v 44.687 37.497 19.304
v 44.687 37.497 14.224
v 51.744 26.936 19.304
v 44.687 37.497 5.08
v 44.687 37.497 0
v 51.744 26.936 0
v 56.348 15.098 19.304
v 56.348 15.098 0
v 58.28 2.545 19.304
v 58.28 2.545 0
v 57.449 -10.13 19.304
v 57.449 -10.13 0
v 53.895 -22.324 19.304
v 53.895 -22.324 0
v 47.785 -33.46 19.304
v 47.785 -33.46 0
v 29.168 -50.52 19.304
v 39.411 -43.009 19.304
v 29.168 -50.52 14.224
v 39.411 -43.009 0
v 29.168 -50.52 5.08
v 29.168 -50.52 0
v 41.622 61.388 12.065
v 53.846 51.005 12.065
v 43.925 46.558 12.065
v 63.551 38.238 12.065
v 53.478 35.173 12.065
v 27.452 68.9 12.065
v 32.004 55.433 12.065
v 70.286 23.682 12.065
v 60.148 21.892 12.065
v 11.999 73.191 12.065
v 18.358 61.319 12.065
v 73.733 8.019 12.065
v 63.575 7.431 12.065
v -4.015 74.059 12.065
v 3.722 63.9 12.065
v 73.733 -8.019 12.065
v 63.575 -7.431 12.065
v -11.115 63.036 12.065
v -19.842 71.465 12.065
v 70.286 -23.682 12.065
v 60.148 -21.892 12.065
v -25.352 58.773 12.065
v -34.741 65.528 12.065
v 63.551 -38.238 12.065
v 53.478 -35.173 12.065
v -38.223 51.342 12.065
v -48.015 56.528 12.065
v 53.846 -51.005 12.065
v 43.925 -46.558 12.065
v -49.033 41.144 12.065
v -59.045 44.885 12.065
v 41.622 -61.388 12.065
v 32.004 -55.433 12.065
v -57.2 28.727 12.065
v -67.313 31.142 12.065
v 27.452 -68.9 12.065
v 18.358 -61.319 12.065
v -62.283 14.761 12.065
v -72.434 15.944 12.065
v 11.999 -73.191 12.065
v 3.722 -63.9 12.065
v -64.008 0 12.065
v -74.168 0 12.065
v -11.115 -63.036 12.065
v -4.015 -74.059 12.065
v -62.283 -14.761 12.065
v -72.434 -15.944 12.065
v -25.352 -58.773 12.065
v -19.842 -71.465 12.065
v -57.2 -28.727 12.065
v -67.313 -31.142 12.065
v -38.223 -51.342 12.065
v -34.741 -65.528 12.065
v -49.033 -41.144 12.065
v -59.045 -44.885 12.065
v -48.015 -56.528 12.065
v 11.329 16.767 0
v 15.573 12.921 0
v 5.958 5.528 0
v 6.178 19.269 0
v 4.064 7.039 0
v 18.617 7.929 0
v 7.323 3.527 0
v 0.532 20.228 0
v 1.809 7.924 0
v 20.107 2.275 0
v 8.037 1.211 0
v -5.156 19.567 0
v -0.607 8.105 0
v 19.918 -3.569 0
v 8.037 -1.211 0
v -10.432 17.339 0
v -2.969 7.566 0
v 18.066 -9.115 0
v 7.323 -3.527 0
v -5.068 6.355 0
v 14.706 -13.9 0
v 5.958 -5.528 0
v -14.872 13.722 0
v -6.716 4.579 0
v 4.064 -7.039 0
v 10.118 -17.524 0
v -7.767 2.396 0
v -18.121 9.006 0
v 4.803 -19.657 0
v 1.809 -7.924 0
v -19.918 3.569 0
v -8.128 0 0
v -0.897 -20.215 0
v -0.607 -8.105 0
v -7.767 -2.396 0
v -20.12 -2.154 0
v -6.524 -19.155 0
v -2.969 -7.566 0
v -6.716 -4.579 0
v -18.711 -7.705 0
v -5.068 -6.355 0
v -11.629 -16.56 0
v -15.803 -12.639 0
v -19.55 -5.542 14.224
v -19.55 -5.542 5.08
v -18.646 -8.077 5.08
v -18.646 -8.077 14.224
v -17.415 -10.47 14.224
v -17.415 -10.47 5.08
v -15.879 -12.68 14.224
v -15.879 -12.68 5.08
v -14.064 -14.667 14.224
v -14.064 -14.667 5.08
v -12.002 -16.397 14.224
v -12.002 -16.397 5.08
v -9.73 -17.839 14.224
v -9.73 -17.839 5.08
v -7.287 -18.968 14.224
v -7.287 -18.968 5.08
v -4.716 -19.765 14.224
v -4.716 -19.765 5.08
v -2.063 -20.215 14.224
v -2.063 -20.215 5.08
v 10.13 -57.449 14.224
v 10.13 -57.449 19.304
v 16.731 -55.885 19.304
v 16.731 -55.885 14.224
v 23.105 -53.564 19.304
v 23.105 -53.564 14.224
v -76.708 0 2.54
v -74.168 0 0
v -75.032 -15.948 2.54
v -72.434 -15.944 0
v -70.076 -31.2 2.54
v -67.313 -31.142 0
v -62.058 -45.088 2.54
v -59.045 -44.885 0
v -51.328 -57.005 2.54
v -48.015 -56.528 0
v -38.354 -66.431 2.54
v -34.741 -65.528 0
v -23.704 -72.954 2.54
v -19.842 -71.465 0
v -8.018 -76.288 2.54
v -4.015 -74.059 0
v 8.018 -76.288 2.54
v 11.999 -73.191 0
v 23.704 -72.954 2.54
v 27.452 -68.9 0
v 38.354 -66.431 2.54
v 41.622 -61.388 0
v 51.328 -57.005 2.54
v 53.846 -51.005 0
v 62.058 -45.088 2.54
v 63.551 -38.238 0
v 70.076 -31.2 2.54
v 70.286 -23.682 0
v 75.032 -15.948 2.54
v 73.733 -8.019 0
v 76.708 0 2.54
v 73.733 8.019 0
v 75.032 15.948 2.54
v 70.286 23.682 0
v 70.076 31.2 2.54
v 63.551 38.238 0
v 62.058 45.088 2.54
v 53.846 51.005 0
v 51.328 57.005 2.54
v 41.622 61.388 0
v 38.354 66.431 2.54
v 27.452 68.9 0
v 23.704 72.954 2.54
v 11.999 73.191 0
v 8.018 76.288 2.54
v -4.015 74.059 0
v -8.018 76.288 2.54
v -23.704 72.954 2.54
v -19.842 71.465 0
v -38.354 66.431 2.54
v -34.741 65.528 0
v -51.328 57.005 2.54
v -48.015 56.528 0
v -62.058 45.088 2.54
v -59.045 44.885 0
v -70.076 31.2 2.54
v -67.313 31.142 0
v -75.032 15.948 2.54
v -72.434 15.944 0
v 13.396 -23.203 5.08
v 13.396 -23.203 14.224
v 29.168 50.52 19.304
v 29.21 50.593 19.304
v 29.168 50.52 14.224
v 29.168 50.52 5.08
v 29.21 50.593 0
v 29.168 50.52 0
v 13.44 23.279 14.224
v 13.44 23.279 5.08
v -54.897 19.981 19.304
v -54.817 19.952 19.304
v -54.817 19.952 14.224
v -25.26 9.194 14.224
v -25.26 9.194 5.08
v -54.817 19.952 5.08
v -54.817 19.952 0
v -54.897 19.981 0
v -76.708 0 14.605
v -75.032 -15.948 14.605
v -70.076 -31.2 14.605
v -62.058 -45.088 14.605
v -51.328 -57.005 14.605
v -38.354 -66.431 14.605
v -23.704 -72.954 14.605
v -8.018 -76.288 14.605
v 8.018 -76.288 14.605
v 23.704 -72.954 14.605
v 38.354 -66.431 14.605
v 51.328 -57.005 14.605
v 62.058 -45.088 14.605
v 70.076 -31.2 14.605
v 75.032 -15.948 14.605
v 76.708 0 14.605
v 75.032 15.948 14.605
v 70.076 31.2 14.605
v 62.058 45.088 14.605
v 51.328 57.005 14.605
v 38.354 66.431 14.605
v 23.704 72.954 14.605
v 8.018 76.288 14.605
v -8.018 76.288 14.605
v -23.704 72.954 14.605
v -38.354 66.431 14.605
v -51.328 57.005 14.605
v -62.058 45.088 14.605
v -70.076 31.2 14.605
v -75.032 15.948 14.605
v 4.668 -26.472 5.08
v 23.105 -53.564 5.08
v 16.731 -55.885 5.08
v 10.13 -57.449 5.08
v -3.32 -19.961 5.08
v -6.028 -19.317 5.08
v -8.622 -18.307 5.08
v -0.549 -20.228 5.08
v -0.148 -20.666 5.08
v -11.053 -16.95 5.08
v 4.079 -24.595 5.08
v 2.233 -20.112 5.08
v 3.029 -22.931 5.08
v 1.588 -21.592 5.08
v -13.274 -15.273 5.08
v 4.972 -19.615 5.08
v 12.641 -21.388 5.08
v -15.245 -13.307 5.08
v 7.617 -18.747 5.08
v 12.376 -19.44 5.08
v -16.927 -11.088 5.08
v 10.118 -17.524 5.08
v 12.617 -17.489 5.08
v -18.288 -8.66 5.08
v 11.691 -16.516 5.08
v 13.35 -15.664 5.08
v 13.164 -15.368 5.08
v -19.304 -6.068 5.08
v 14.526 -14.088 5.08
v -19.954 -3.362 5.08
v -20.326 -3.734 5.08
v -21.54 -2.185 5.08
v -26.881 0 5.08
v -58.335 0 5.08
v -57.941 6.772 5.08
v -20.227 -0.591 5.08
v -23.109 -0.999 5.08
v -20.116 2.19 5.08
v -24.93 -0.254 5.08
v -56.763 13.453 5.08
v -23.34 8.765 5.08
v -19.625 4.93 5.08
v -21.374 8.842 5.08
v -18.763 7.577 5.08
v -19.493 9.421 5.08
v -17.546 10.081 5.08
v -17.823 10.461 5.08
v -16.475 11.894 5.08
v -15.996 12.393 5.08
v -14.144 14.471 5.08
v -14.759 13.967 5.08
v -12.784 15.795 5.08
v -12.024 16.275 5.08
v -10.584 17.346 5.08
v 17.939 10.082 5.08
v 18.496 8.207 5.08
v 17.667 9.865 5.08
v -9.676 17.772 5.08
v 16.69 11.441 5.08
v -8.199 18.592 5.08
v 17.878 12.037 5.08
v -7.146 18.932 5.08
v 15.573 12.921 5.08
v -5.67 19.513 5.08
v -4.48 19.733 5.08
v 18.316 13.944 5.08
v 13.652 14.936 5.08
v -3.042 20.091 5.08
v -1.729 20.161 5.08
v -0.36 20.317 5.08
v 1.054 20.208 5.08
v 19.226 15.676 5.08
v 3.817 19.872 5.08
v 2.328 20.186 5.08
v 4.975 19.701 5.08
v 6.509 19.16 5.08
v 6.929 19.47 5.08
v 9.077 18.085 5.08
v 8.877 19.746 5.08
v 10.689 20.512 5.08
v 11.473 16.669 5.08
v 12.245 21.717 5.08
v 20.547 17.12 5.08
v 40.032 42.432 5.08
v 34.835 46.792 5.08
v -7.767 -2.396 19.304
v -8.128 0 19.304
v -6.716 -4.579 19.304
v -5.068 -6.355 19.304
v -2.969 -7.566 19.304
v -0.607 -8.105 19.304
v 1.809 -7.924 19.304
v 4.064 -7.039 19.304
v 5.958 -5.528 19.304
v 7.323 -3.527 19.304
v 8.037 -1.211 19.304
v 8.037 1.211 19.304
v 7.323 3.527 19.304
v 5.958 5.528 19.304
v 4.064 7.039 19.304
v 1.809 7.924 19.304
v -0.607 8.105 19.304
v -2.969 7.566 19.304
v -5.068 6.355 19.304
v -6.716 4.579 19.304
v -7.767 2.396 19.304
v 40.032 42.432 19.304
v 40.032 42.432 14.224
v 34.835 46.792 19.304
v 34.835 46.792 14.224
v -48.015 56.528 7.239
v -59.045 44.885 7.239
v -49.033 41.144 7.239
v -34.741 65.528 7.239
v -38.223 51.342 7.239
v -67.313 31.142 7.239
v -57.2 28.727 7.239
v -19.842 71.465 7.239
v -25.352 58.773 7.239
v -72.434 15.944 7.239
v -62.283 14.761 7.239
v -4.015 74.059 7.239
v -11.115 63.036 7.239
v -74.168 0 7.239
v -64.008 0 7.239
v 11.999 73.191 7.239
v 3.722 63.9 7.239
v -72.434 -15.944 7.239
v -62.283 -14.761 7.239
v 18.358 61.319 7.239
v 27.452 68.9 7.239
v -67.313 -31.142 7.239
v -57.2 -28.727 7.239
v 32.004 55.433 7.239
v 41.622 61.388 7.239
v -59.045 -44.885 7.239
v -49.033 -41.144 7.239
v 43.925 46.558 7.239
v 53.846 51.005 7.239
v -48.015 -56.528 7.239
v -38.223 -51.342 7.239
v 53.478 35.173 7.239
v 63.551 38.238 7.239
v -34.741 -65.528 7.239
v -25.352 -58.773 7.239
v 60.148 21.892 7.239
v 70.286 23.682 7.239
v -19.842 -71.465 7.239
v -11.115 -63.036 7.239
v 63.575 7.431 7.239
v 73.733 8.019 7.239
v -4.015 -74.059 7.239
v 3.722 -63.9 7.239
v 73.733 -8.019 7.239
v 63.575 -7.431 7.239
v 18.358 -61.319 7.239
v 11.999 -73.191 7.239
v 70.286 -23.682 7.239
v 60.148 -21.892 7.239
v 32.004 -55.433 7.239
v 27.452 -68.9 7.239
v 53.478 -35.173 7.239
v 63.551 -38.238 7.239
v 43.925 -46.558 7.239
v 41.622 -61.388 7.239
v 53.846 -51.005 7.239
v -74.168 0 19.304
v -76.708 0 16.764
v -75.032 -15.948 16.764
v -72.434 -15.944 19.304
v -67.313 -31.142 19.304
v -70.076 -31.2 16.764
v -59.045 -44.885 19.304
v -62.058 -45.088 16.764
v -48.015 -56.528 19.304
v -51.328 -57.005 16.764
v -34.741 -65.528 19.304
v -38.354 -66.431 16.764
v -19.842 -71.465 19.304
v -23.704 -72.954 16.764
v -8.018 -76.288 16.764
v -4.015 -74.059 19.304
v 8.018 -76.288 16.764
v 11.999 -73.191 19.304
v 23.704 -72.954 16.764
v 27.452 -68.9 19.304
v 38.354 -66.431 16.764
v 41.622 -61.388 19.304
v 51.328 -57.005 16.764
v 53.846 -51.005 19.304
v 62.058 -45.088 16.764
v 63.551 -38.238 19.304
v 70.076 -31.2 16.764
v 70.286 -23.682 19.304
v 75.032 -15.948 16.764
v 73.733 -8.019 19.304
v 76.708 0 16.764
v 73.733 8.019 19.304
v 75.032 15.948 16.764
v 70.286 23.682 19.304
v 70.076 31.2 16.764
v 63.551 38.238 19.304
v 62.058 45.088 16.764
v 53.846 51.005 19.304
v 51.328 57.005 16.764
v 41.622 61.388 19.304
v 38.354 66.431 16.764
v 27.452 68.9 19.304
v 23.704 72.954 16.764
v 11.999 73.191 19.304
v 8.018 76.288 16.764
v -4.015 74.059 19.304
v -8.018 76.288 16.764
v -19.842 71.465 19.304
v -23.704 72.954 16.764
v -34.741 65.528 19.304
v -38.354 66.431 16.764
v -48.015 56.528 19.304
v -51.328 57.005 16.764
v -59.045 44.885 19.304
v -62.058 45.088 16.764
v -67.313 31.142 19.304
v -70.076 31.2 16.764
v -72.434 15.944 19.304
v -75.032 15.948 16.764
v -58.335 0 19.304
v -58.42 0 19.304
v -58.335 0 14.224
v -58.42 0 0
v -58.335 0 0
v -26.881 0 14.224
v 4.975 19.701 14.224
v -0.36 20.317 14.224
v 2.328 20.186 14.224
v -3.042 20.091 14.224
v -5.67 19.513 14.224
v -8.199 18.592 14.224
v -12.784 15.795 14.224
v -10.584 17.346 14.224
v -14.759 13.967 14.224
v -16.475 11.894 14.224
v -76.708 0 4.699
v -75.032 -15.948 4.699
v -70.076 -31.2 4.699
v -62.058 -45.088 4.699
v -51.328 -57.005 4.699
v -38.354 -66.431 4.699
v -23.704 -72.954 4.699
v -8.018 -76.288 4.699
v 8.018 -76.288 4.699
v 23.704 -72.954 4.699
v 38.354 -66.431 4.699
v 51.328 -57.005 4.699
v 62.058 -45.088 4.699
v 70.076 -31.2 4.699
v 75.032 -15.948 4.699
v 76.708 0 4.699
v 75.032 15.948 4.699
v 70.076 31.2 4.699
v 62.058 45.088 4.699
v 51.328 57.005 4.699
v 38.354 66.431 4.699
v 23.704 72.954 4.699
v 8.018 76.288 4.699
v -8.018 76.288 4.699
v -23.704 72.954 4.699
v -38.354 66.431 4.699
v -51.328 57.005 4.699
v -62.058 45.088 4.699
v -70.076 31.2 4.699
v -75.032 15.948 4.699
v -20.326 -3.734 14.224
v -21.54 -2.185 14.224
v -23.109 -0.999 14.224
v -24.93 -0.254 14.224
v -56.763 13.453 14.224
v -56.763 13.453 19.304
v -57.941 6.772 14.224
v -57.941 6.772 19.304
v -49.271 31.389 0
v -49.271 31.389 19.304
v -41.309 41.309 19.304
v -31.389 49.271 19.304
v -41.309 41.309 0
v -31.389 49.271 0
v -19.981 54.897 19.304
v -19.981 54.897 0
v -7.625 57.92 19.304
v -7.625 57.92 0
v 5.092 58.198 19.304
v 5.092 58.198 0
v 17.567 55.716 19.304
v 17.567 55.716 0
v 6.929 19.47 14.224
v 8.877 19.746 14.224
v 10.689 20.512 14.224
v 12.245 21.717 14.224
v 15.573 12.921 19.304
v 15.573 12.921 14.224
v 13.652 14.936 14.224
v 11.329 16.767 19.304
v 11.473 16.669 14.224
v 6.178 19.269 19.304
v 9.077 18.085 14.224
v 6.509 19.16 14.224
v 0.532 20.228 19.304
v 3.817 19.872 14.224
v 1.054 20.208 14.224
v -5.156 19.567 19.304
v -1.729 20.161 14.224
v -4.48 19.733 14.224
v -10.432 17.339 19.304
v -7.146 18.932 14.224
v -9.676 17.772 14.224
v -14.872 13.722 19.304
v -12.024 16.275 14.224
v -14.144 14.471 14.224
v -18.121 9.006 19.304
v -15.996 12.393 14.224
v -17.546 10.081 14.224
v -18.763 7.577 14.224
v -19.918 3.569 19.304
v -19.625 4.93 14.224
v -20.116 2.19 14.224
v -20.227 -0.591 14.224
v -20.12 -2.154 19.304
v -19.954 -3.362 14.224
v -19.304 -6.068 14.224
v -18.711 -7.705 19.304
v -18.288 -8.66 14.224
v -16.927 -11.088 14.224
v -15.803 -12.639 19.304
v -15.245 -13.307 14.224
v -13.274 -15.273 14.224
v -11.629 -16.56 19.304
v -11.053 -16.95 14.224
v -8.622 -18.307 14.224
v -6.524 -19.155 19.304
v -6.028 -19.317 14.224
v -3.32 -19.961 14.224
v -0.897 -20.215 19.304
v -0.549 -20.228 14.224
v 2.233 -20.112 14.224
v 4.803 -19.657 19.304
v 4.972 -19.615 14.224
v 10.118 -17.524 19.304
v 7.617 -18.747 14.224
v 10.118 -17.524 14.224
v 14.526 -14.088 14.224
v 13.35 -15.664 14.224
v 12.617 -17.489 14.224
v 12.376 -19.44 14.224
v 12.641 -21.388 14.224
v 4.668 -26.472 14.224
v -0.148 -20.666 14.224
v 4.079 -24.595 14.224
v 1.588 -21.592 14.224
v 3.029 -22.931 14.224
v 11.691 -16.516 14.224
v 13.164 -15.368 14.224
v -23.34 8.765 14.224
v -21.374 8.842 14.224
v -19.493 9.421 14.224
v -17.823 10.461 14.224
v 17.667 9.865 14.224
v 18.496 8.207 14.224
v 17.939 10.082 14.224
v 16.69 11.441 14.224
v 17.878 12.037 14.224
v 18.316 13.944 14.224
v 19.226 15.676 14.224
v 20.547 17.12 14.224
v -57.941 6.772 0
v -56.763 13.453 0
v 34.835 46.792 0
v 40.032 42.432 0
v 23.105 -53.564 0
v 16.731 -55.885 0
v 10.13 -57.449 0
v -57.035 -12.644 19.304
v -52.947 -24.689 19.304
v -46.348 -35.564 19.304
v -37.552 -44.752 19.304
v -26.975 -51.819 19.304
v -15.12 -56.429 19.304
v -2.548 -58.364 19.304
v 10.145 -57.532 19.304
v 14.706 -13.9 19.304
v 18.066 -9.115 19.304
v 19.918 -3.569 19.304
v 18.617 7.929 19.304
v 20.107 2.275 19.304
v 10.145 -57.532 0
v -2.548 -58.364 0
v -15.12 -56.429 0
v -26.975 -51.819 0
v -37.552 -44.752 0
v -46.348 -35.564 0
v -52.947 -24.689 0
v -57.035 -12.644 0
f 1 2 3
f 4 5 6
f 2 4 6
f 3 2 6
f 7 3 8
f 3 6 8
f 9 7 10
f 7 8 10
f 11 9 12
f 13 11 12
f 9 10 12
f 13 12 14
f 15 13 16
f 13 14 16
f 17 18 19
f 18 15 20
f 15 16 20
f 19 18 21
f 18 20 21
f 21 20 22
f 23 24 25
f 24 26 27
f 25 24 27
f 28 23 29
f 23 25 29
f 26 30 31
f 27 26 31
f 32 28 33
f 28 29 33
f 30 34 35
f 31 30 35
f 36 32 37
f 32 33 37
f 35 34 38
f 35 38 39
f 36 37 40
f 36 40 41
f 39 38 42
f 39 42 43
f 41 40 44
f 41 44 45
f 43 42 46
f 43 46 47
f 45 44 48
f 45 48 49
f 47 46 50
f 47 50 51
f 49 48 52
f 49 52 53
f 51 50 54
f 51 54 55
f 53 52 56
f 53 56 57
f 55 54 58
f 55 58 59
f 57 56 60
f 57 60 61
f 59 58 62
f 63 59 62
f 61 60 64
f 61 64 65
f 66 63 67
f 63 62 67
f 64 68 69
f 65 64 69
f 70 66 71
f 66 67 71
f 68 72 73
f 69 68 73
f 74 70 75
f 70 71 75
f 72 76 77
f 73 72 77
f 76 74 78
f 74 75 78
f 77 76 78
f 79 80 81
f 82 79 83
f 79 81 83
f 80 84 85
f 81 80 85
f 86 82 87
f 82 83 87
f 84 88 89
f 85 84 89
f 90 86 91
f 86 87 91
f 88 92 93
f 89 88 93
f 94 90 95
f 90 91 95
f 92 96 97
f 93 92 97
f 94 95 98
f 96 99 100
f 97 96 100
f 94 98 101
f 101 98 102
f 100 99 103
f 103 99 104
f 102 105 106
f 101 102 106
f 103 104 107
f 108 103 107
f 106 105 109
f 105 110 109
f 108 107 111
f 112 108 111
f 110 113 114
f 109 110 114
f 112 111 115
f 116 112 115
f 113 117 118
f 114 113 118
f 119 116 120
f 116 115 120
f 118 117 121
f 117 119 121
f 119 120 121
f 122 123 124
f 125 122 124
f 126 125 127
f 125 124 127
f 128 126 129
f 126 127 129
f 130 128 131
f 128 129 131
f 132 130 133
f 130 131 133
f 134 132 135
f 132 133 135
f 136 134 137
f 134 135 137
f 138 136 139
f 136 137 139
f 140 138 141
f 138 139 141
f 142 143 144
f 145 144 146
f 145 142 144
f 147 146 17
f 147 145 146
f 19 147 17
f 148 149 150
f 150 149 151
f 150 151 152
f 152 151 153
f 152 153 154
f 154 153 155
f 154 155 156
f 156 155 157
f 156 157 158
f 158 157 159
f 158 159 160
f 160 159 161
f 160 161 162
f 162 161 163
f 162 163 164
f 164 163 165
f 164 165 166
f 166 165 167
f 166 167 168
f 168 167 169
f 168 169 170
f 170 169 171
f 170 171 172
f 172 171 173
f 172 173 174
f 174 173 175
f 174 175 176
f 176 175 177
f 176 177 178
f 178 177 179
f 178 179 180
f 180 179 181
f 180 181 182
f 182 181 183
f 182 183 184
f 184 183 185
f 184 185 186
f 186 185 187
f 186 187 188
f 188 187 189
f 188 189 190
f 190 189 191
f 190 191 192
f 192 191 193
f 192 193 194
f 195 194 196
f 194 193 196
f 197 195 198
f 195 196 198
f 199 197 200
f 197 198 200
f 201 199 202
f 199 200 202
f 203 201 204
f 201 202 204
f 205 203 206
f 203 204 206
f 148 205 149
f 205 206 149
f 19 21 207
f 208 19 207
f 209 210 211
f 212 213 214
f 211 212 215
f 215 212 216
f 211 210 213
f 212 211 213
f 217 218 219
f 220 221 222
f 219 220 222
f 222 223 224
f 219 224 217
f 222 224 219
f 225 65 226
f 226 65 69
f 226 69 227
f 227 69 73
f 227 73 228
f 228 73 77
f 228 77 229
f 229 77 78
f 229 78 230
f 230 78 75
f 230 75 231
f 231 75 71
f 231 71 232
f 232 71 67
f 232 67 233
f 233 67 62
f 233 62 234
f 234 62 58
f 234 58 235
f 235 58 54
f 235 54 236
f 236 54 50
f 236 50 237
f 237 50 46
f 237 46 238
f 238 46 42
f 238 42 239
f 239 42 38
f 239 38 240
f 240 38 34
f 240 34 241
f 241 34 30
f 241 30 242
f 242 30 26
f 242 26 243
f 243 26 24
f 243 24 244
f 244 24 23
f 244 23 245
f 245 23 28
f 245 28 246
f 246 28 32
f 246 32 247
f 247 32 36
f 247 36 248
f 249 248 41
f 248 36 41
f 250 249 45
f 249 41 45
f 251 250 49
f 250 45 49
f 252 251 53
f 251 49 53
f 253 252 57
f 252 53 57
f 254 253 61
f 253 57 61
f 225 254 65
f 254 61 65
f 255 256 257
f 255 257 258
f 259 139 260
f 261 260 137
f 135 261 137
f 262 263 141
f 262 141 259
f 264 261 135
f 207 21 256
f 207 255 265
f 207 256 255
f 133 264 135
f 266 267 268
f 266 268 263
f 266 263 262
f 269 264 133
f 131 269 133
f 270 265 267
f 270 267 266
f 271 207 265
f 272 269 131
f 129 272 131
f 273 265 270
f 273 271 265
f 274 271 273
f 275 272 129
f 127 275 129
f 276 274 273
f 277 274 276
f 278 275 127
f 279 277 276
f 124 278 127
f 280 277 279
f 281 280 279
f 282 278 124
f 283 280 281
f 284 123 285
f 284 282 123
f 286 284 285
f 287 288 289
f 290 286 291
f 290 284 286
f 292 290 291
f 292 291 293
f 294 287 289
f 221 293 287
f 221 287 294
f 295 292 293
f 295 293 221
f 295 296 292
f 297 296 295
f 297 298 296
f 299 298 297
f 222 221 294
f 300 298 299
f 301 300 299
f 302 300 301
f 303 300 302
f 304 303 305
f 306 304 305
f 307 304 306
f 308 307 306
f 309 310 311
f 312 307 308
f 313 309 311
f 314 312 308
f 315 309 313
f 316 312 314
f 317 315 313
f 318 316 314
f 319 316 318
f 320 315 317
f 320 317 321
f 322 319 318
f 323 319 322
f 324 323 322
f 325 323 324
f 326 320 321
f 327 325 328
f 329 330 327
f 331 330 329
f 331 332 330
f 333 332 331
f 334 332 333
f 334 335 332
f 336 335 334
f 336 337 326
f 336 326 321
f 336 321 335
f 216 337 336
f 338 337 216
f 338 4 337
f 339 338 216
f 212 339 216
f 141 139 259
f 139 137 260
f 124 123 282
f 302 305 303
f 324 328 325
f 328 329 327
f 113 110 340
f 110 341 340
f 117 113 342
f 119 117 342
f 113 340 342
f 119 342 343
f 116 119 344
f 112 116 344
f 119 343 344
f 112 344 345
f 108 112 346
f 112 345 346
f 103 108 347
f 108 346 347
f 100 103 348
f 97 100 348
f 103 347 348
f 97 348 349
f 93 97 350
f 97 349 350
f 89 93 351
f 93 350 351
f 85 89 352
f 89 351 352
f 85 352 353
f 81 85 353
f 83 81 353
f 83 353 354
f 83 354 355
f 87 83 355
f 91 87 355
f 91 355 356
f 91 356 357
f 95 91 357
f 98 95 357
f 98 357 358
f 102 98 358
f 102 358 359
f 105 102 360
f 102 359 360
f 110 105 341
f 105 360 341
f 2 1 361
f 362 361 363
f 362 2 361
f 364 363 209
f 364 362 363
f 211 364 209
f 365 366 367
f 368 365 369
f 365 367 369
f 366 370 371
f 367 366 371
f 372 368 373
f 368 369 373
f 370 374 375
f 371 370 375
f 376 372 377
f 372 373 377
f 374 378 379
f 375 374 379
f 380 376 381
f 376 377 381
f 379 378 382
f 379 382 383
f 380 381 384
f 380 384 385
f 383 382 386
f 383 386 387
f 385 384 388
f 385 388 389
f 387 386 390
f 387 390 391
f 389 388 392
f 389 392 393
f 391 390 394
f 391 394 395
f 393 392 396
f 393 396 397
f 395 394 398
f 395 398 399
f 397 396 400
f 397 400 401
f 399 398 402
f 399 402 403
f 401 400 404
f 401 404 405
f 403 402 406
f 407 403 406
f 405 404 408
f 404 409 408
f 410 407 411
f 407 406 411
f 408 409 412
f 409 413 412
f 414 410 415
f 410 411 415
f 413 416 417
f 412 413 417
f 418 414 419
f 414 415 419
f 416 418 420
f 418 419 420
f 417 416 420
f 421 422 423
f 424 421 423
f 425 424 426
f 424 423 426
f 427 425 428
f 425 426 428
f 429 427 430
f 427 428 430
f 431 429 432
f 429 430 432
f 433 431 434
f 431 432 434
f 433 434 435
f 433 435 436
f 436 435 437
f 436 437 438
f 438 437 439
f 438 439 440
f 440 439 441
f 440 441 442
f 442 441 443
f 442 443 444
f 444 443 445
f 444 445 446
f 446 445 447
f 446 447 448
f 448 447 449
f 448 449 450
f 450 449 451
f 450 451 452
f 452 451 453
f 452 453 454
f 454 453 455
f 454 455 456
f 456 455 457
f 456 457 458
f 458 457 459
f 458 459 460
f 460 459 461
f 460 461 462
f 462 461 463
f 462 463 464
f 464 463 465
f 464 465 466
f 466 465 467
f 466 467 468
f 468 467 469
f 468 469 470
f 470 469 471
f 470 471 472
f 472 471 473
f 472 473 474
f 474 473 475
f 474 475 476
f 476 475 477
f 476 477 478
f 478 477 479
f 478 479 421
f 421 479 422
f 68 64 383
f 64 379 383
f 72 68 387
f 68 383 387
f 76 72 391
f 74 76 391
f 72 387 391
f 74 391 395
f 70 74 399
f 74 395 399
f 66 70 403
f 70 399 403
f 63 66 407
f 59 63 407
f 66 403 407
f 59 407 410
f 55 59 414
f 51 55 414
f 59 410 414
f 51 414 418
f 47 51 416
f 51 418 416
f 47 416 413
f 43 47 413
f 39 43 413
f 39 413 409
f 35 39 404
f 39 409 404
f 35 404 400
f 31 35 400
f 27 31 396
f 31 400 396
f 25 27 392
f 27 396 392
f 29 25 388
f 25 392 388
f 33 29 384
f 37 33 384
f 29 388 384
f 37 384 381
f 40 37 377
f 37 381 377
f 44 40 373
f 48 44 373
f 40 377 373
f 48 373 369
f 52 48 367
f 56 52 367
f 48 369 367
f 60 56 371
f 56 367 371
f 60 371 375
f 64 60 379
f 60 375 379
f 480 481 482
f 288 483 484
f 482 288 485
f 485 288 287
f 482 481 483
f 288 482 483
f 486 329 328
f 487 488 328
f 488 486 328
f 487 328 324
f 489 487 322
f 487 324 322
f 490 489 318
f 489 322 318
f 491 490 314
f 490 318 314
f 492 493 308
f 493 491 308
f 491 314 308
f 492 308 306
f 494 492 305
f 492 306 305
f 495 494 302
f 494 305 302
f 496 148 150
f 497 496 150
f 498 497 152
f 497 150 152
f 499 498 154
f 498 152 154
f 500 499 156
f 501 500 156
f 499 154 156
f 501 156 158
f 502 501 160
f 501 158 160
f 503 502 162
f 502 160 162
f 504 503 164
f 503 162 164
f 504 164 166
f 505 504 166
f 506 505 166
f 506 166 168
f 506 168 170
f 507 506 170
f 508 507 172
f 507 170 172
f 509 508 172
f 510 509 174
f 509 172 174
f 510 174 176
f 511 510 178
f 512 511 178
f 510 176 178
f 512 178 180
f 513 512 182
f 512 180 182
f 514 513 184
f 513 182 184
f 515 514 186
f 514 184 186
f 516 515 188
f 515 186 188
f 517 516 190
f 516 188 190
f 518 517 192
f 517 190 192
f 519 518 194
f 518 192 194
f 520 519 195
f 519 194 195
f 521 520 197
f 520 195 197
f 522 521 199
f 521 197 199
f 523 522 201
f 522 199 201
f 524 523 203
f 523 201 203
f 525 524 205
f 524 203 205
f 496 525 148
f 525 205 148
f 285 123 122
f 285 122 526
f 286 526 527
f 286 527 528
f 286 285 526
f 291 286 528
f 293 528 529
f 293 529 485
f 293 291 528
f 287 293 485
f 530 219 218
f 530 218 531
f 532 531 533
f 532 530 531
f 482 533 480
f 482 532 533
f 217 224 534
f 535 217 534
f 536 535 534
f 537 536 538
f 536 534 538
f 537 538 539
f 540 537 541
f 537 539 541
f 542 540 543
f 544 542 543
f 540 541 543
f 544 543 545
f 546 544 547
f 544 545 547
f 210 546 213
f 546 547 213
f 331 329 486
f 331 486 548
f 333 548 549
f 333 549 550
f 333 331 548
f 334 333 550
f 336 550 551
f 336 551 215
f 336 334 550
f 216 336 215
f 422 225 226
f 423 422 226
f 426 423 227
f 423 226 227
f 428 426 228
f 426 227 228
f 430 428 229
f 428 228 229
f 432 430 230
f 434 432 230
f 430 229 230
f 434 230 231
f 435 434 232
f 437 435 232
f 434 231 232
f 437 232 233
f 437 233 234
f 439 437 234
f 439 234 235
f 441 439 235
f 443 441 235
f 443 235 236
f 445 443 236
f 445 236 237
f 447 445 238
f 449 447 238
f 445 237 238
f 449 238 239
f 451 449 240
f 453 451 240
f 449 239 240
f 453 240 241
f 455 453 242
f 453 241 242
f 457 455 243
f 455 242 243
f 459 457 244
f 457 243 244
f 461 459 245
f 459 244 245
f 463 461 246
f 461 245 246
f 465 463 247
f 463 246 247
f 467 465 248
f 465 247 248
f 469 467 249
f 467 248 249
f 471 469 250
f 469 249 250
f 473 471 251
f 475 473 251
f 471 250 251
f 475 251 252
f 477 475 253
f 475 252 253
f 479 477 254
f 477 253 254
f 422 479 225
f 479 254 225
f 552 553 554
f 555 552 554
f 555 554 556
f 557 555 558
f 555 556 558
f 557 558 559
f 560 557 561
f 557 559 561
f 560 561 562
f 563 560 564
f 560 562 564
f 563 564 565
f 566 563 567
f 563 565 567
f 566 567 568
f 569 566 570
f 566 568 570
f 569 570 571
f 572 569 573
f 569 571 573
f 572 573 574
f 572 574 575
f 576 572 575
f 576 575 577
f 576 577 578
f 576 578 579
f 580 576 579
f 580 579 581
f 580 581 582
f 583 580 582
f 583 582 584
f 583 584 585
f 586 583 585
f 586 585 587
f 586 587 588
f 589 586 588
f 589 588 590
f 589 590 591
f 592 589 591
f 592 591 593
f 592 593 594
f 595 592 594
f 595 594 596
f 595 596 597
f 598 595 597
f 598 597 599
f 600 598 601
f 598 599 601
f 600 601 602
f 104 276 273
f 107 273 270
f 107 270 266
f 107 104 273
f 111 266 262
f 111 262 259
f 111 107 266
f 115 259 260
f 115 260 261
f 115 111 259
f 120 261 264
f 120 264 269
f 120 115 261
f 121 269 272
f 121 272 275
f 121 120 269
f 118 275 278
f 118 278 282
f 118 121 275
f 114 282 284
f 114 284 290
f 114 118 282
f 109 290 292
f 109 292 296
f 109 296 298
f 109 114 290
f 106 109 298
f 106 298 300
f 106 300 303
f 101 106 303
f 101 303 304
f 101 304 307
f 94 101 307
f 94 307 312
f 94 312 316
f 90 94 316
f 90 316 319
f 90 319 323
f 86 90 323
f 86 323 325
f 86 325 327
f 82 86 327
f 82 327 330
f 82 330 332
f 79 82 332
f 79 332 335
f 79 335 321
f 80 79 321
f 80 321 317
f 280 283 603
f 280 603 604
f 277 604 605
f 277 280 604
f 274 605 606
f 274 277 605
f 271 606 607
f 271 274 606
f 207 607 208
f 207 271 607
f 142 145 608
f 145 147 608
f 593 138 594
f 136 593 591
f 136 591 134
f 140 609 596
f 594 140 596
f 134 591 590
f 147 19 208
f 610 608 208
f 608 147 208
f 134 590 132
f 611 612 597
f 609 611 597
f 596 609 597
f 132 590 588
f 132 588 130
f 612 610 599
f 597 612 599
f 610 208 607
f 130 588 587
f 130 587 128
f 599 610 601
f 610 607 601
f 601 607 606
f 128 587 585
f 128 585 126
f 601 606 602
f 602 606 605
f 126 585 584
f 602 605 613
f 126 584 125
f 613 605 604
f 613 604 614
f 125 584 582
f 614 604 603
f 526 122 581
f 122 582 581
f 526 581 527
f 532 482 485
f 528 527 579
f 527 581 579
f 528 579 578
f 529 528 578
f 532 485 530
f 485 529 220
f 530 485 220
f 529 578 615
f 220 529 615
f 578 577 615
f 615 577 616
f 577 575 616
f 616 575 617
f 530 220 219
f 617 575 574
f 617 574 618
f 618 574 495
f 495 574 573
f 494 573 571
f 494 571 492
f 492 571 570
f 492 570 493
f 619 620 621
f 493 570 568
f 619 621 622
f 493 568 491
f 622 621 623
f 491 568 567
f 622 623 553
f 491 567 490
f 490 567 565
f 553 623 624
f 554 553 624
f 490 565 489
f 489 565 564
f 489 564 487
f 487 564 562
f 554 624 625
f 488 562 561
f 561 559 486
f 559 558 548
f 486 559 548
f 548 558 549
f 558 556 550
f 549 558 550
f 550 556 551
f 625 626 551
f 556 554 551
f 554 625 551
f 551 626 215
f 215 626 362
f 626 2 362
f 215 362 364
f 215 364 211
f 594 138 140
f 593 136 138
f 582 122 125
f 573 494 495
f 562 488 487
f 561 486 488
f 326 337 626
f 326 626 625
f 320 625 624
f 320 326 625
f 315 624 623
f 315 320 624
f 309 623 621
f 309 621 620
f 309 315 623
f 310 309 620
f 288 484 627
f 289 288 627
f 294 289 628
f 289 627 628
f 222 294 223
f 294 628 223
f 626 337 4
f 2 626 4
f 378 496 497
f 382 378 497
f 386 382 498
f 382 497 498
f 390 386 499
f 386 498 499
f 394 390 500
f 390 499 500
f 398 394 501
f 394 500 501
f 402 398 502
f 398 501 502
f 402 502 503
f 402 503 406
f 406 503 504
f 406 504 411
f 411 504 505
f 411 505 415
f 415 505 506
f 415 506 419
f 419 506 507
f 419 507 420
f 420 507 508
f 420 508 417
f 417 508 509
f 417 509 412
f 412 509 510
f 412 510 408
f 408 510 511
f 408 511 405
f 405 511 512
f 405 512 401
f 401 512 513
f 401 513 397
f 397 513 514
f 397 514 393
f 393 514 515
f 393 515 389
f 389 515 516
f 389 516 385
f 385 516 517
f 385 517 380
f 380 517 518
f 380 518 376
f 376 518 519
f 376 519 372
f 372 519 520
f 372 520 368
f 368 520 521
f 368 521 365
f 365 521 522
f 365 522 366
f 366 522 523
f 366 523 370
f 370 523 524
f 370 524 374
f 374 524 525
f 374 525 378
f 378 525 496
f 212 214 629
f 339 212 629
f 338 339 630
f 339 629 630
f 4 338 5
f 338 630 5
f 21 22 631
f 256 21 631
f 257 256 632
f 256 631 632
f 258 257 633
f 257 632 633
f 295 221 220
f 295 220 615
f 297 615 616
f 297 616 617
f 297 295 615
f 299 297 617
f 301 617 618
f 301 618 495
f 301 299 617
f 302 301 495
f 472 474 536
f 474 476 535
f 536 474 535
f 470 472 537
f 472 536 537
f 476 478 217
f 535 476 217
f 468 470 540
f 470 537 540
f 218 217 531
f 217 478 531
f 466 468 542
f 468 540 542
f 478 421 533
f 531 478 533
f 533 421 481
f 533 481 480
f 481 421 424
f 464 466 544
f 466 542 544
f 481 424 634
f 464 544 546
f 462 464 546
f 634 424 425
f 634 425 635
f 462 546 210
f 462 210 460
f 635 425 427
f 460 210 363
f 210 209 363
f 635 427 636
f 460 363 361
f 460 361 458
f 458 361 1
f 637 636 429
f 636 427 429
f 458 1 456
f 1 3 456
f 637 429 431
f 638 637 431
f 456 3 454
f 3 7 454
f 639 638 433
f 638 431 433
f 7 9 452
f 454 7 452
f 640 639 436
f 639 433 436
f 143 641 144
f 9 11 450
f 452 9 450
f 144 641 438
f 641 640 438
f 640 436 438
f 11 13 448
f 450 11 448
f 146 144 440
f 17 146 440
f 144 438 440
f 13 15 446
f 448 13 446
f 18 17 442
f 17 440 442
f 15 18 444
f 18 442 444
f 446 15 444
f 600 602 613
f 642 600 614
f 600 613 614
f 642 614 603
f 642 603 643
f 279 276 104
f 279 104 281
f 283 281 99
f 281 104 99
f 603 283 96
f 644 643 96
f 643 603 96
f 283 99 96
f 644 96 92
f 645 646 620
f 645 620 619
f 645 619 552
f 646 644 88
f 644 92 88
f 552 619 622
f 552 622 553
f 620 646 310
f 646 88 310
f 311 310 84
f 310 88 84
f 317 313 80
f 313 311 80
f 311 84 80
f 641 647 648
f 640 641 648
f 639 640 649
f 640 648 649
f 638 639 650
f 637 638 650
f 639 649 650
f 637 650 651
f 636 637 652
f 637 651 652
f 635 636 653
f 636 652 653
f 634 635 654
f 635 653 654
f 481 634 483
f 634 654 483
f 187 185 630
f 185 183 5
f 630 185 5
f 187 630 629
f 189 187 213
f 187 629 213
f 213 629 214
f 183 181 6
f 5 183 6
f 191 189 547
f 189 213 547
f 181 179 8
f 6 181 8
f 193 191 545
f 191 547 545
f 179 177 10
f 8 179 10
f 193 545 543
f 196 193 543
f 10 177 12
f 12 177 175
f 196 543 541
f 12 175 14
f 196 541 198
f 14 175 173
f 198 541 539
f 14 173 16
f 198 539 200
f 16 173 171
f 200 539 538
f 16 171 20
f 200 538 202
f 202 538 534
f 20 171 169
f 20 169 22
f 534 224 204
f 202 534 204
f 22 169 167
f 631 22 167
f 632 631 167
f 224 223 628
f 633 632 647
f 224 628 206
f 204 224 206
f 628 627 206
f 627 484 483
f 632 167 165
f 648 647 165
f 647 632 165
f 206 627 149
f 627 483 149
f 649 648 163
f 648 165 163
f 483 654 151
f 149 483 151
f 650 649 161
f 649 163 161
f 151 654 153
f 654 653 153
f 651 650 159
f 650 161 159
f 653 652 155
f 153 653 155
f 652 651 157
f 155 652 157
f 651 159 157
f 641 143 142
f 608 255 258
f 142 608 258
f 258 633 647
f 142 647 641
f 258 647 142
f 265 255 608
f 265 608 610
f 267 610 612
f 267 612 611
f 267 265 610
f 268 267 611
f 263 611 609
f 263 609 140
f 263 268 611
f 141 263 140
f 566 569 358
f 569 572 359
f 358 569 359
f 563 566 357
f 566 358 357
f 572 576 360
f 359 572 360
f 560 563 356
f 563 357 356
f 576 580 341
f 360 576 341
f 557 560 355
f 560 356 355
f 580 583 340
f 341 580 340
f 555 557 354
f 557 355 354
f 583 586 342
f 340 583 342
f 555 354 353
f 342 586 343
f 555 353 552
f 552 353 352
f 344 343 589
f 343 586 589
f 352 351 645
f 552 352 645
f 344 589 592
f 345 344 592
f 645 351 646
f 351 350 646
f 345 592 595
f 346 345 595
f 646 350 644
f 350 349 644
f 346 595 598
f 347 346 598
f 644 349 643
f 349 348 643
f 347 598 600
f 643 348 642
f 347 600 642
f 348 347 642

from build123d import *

# Parameters (mm, degrees)
CHAMFER1_SIZE      = 2.54
CUT_EXTRUDE1_DEPTH = 111.185656707
SKETCH6_R          = 58.335249529
SKETCH6_R_2        = 20.235249529
CUT_EXTRUDE2_DEPTH = 5.08
CUT_EXTRUDE3_START = -5.08
SKETCH7_R          = 58.335249529
SKETCH7_R_2        = 20.235249529
CUT_EXTRUDE3_DEPTH = 5.08
FILLET15_R         = 7.62


with BuildPart() as part:
    # Sketch2 → Revolve1 (revolve)
    with BuildSketch(Plane.YZ, mode=Mode.PRIVATE) as revolve1_sk:
        Polygon((8.128, 0), (8.128, 19.304), (76.708, 19.304), (76.708, 12.065), (64.008, 12.065), (64.008, 7.239), (76.708, 7.239), (76.708, 0), align=None)
    revolve(revolve1_sk.sketch.rotate(Axis((0, 0, 0), (0, 0, 1)), 90), axis=Axis((0, 0, 0), (0, 0, 1)))

    # Chamfer1
    chamfer1_edges = [part.edges().sort_by_distance(p)[0] for p in [
        (76.708, 0, 0),
        (76.708, 0, 7.239),
        (76.708, 0, 12.065),
        (76.708, 0, 19.304),
    ]]
    chamfer(chamfer1_edges, length=CHAMFER1_SIZE)

    # Sketch5 → Cut-Extrude1 (cut, through all)
    with BuildSketch(Plane(origin=(0, 0, 0), x_dir=(1, 0, 0), z_dir=(0, 0, -1))):
        with BuildLine():
            Line((-58.42, 0), (-20.32, 0))
            ThreePointArc((-20.32, 0), (-13.061444229, 15.566023084), (3.52853097, 20.011293541))
            Line((3.52853097, 20.011293541), (10.144526539, 57.532468931))
            ThreePointArc((10.144526539, 57.532468931), (-37.551652158, 44.752316367), (-58.42, 0))
        make_face()
        with BuildLine():
            Line((29.21, -50.593204089), (10.16, -17.597636205))
            ThreePointArc((10.16, -17.597636205), (-6.949849312, -19.094554054), (-19.094554054, -6.949849312))
            Line((-19.094554054, -6.949849312), (-54.896842906, -19.980816773))
            ThreePointArc((-54.896842906, -19.980816773), (-19.980816773, -54.896842906), (29.21, -50.593204089))
        make_face()
        with BuildLine():
            Line((15.5725915, -12.921289312), (44.68739374, -37.497175605))
            ThreePointArc((44.68739374, -37.497175605), (57.44900601, 10.129809775), (29.167624765, 50.519808029))
            Line((29.167624765, 50.519808029), (10.117624765, 17.524240144))
            ThreePointArc((10.117624765, 17.524240144), (19.918066395, 3.568746925), (15.5725915, -12.921289312))
        make_face()
    extrude(amount=-CUT_EXTRUDE1_DEPTH, mode=Mode.SUBTRACT)

    # Sketch6 → Cut-Extrude2 (cut)
    with BuildSketch(Plane(origin=(0, 0, 0), x_dir=(1, 0, 0), z_dir=(0, 0, -1))):
        Circle(SKETCH6_R)
        with Locations(Location((0, 0, 0), (0, 0, 60))):
            Circle(SKETCH6_R_2, mode=Mode.SUBTRACT)
    extrude(amount=-CUT_EXTRUDE2_DEPTH, mode=Mode.SUBTRACT)

    # Sketch7 → Cut-Extrude3 (cut)
    with BuildSketch(Plane(origin=(0, 0, 19.304), x_dir=(0, -1, 0), z_dir=(0, 0, 1)).offset(CUT_EXTRUDE3_START)):
        Circle(SKETCH7_R)
        with Locations(Location((0, 0, 0), (0, 0, 90))):
            Circle(SKETCH7_R_2, mode=Mode.SUBTRACT)
    extrude(amount=CUT_EXTRUDE3_DEPTH, mode=Mode.SUBTRACT)

    # Fillet15
    # the kernel refuses this fillet: 7.62 mm, written as the material it adds along each edge
    with BuildSketch(Plane(origin=(10.16, 17.597636205, 5.08), x_dir=(-0.9266160044504649, 0.3760090162433024, 0), z_dir=(0, 0, 1)), Plane(origin=(-20.32, 0, 5.08), x_dir=(0.13767464210654276, -0.9904775075289874, 0), z_dir=(0, 0, 1))) as fillet15_piece_1:
        with BuildLine():
            CenterArc((6.644178228, -7.547438607), FILLET15_R, 97.913310066, 74.173379868)
            Line((-0.903260379, -6.498357835), (0, 0))
            ThreePointArc((0, 0), (2.797548728, -0.193497047), (5.595097455, 0))
        make_face()
    extrude(amount=9.144)
    with BuildSketch(Plane(origin=(-19.094554054, 6.949849312, 5.08), x_dir=(0.4681351043427711, 0.8836569040538205, 0), z_dir=(0, 0, 1)), Plane(origin=(3.52853097, -20.011293541, 5.08), x_dir=(-0.9993368793115024, -0.03641155926279142, 0), z_dir=(0, 0, 1))) as fillet15_piece_2:
        with BuildLine():
            CenterArc((6.644178228, 7.547438607), FILLET15_R, 187.913310066, 74.173379868)
            Line((-0.903260379, 6.498357835), (0, 0))
            ThreePointArc((0, 0), (2.797548728, 0.193497047), (5.595097455, 0))
        make_face()
    extrude(amount=9.144)
    with BuildSketch(Plane(origin=(15.5725915, 12.921289312, 5.08), x_dir=(0.5270307863696181, -0.8498461920951471, 0), z_dir=(0, 0, 1))) as fillet15_piece_3:
        with BuildLine():
            CenterArc((6.592305904, 7.548065724), FILLET15_R, 188.362749939, 73.758264082)
            Line((-0.946671381, 6.439814174), (0, 0))
            ThreePointArc((0, 0), (2.773873375, 0.191024675), (5.54774675, 0))
        make_face()
    extrude(amount=9.144)
    with BuildSketch(Plane(origin=(10.117624765, -17.524240144, 5.08), x_dir=(0.5000000000000031, -0.8660254037844368, 0), z_dir=(0, 0, 1))) as fillet15_piece_4:
        with BuildLine():
            CenterArc((6.557483186, 7.62), FILLET15_R, 195.876042448, 74.123957552)
            ThreePointArc((-0.771857845, 5.535495248), (-0.193893401, 2.794524654), (0, 0))
            Line((0, 0), (6.557483186, 0))
        make_face()
    extrude(amount=9.144)


solid = part.part
